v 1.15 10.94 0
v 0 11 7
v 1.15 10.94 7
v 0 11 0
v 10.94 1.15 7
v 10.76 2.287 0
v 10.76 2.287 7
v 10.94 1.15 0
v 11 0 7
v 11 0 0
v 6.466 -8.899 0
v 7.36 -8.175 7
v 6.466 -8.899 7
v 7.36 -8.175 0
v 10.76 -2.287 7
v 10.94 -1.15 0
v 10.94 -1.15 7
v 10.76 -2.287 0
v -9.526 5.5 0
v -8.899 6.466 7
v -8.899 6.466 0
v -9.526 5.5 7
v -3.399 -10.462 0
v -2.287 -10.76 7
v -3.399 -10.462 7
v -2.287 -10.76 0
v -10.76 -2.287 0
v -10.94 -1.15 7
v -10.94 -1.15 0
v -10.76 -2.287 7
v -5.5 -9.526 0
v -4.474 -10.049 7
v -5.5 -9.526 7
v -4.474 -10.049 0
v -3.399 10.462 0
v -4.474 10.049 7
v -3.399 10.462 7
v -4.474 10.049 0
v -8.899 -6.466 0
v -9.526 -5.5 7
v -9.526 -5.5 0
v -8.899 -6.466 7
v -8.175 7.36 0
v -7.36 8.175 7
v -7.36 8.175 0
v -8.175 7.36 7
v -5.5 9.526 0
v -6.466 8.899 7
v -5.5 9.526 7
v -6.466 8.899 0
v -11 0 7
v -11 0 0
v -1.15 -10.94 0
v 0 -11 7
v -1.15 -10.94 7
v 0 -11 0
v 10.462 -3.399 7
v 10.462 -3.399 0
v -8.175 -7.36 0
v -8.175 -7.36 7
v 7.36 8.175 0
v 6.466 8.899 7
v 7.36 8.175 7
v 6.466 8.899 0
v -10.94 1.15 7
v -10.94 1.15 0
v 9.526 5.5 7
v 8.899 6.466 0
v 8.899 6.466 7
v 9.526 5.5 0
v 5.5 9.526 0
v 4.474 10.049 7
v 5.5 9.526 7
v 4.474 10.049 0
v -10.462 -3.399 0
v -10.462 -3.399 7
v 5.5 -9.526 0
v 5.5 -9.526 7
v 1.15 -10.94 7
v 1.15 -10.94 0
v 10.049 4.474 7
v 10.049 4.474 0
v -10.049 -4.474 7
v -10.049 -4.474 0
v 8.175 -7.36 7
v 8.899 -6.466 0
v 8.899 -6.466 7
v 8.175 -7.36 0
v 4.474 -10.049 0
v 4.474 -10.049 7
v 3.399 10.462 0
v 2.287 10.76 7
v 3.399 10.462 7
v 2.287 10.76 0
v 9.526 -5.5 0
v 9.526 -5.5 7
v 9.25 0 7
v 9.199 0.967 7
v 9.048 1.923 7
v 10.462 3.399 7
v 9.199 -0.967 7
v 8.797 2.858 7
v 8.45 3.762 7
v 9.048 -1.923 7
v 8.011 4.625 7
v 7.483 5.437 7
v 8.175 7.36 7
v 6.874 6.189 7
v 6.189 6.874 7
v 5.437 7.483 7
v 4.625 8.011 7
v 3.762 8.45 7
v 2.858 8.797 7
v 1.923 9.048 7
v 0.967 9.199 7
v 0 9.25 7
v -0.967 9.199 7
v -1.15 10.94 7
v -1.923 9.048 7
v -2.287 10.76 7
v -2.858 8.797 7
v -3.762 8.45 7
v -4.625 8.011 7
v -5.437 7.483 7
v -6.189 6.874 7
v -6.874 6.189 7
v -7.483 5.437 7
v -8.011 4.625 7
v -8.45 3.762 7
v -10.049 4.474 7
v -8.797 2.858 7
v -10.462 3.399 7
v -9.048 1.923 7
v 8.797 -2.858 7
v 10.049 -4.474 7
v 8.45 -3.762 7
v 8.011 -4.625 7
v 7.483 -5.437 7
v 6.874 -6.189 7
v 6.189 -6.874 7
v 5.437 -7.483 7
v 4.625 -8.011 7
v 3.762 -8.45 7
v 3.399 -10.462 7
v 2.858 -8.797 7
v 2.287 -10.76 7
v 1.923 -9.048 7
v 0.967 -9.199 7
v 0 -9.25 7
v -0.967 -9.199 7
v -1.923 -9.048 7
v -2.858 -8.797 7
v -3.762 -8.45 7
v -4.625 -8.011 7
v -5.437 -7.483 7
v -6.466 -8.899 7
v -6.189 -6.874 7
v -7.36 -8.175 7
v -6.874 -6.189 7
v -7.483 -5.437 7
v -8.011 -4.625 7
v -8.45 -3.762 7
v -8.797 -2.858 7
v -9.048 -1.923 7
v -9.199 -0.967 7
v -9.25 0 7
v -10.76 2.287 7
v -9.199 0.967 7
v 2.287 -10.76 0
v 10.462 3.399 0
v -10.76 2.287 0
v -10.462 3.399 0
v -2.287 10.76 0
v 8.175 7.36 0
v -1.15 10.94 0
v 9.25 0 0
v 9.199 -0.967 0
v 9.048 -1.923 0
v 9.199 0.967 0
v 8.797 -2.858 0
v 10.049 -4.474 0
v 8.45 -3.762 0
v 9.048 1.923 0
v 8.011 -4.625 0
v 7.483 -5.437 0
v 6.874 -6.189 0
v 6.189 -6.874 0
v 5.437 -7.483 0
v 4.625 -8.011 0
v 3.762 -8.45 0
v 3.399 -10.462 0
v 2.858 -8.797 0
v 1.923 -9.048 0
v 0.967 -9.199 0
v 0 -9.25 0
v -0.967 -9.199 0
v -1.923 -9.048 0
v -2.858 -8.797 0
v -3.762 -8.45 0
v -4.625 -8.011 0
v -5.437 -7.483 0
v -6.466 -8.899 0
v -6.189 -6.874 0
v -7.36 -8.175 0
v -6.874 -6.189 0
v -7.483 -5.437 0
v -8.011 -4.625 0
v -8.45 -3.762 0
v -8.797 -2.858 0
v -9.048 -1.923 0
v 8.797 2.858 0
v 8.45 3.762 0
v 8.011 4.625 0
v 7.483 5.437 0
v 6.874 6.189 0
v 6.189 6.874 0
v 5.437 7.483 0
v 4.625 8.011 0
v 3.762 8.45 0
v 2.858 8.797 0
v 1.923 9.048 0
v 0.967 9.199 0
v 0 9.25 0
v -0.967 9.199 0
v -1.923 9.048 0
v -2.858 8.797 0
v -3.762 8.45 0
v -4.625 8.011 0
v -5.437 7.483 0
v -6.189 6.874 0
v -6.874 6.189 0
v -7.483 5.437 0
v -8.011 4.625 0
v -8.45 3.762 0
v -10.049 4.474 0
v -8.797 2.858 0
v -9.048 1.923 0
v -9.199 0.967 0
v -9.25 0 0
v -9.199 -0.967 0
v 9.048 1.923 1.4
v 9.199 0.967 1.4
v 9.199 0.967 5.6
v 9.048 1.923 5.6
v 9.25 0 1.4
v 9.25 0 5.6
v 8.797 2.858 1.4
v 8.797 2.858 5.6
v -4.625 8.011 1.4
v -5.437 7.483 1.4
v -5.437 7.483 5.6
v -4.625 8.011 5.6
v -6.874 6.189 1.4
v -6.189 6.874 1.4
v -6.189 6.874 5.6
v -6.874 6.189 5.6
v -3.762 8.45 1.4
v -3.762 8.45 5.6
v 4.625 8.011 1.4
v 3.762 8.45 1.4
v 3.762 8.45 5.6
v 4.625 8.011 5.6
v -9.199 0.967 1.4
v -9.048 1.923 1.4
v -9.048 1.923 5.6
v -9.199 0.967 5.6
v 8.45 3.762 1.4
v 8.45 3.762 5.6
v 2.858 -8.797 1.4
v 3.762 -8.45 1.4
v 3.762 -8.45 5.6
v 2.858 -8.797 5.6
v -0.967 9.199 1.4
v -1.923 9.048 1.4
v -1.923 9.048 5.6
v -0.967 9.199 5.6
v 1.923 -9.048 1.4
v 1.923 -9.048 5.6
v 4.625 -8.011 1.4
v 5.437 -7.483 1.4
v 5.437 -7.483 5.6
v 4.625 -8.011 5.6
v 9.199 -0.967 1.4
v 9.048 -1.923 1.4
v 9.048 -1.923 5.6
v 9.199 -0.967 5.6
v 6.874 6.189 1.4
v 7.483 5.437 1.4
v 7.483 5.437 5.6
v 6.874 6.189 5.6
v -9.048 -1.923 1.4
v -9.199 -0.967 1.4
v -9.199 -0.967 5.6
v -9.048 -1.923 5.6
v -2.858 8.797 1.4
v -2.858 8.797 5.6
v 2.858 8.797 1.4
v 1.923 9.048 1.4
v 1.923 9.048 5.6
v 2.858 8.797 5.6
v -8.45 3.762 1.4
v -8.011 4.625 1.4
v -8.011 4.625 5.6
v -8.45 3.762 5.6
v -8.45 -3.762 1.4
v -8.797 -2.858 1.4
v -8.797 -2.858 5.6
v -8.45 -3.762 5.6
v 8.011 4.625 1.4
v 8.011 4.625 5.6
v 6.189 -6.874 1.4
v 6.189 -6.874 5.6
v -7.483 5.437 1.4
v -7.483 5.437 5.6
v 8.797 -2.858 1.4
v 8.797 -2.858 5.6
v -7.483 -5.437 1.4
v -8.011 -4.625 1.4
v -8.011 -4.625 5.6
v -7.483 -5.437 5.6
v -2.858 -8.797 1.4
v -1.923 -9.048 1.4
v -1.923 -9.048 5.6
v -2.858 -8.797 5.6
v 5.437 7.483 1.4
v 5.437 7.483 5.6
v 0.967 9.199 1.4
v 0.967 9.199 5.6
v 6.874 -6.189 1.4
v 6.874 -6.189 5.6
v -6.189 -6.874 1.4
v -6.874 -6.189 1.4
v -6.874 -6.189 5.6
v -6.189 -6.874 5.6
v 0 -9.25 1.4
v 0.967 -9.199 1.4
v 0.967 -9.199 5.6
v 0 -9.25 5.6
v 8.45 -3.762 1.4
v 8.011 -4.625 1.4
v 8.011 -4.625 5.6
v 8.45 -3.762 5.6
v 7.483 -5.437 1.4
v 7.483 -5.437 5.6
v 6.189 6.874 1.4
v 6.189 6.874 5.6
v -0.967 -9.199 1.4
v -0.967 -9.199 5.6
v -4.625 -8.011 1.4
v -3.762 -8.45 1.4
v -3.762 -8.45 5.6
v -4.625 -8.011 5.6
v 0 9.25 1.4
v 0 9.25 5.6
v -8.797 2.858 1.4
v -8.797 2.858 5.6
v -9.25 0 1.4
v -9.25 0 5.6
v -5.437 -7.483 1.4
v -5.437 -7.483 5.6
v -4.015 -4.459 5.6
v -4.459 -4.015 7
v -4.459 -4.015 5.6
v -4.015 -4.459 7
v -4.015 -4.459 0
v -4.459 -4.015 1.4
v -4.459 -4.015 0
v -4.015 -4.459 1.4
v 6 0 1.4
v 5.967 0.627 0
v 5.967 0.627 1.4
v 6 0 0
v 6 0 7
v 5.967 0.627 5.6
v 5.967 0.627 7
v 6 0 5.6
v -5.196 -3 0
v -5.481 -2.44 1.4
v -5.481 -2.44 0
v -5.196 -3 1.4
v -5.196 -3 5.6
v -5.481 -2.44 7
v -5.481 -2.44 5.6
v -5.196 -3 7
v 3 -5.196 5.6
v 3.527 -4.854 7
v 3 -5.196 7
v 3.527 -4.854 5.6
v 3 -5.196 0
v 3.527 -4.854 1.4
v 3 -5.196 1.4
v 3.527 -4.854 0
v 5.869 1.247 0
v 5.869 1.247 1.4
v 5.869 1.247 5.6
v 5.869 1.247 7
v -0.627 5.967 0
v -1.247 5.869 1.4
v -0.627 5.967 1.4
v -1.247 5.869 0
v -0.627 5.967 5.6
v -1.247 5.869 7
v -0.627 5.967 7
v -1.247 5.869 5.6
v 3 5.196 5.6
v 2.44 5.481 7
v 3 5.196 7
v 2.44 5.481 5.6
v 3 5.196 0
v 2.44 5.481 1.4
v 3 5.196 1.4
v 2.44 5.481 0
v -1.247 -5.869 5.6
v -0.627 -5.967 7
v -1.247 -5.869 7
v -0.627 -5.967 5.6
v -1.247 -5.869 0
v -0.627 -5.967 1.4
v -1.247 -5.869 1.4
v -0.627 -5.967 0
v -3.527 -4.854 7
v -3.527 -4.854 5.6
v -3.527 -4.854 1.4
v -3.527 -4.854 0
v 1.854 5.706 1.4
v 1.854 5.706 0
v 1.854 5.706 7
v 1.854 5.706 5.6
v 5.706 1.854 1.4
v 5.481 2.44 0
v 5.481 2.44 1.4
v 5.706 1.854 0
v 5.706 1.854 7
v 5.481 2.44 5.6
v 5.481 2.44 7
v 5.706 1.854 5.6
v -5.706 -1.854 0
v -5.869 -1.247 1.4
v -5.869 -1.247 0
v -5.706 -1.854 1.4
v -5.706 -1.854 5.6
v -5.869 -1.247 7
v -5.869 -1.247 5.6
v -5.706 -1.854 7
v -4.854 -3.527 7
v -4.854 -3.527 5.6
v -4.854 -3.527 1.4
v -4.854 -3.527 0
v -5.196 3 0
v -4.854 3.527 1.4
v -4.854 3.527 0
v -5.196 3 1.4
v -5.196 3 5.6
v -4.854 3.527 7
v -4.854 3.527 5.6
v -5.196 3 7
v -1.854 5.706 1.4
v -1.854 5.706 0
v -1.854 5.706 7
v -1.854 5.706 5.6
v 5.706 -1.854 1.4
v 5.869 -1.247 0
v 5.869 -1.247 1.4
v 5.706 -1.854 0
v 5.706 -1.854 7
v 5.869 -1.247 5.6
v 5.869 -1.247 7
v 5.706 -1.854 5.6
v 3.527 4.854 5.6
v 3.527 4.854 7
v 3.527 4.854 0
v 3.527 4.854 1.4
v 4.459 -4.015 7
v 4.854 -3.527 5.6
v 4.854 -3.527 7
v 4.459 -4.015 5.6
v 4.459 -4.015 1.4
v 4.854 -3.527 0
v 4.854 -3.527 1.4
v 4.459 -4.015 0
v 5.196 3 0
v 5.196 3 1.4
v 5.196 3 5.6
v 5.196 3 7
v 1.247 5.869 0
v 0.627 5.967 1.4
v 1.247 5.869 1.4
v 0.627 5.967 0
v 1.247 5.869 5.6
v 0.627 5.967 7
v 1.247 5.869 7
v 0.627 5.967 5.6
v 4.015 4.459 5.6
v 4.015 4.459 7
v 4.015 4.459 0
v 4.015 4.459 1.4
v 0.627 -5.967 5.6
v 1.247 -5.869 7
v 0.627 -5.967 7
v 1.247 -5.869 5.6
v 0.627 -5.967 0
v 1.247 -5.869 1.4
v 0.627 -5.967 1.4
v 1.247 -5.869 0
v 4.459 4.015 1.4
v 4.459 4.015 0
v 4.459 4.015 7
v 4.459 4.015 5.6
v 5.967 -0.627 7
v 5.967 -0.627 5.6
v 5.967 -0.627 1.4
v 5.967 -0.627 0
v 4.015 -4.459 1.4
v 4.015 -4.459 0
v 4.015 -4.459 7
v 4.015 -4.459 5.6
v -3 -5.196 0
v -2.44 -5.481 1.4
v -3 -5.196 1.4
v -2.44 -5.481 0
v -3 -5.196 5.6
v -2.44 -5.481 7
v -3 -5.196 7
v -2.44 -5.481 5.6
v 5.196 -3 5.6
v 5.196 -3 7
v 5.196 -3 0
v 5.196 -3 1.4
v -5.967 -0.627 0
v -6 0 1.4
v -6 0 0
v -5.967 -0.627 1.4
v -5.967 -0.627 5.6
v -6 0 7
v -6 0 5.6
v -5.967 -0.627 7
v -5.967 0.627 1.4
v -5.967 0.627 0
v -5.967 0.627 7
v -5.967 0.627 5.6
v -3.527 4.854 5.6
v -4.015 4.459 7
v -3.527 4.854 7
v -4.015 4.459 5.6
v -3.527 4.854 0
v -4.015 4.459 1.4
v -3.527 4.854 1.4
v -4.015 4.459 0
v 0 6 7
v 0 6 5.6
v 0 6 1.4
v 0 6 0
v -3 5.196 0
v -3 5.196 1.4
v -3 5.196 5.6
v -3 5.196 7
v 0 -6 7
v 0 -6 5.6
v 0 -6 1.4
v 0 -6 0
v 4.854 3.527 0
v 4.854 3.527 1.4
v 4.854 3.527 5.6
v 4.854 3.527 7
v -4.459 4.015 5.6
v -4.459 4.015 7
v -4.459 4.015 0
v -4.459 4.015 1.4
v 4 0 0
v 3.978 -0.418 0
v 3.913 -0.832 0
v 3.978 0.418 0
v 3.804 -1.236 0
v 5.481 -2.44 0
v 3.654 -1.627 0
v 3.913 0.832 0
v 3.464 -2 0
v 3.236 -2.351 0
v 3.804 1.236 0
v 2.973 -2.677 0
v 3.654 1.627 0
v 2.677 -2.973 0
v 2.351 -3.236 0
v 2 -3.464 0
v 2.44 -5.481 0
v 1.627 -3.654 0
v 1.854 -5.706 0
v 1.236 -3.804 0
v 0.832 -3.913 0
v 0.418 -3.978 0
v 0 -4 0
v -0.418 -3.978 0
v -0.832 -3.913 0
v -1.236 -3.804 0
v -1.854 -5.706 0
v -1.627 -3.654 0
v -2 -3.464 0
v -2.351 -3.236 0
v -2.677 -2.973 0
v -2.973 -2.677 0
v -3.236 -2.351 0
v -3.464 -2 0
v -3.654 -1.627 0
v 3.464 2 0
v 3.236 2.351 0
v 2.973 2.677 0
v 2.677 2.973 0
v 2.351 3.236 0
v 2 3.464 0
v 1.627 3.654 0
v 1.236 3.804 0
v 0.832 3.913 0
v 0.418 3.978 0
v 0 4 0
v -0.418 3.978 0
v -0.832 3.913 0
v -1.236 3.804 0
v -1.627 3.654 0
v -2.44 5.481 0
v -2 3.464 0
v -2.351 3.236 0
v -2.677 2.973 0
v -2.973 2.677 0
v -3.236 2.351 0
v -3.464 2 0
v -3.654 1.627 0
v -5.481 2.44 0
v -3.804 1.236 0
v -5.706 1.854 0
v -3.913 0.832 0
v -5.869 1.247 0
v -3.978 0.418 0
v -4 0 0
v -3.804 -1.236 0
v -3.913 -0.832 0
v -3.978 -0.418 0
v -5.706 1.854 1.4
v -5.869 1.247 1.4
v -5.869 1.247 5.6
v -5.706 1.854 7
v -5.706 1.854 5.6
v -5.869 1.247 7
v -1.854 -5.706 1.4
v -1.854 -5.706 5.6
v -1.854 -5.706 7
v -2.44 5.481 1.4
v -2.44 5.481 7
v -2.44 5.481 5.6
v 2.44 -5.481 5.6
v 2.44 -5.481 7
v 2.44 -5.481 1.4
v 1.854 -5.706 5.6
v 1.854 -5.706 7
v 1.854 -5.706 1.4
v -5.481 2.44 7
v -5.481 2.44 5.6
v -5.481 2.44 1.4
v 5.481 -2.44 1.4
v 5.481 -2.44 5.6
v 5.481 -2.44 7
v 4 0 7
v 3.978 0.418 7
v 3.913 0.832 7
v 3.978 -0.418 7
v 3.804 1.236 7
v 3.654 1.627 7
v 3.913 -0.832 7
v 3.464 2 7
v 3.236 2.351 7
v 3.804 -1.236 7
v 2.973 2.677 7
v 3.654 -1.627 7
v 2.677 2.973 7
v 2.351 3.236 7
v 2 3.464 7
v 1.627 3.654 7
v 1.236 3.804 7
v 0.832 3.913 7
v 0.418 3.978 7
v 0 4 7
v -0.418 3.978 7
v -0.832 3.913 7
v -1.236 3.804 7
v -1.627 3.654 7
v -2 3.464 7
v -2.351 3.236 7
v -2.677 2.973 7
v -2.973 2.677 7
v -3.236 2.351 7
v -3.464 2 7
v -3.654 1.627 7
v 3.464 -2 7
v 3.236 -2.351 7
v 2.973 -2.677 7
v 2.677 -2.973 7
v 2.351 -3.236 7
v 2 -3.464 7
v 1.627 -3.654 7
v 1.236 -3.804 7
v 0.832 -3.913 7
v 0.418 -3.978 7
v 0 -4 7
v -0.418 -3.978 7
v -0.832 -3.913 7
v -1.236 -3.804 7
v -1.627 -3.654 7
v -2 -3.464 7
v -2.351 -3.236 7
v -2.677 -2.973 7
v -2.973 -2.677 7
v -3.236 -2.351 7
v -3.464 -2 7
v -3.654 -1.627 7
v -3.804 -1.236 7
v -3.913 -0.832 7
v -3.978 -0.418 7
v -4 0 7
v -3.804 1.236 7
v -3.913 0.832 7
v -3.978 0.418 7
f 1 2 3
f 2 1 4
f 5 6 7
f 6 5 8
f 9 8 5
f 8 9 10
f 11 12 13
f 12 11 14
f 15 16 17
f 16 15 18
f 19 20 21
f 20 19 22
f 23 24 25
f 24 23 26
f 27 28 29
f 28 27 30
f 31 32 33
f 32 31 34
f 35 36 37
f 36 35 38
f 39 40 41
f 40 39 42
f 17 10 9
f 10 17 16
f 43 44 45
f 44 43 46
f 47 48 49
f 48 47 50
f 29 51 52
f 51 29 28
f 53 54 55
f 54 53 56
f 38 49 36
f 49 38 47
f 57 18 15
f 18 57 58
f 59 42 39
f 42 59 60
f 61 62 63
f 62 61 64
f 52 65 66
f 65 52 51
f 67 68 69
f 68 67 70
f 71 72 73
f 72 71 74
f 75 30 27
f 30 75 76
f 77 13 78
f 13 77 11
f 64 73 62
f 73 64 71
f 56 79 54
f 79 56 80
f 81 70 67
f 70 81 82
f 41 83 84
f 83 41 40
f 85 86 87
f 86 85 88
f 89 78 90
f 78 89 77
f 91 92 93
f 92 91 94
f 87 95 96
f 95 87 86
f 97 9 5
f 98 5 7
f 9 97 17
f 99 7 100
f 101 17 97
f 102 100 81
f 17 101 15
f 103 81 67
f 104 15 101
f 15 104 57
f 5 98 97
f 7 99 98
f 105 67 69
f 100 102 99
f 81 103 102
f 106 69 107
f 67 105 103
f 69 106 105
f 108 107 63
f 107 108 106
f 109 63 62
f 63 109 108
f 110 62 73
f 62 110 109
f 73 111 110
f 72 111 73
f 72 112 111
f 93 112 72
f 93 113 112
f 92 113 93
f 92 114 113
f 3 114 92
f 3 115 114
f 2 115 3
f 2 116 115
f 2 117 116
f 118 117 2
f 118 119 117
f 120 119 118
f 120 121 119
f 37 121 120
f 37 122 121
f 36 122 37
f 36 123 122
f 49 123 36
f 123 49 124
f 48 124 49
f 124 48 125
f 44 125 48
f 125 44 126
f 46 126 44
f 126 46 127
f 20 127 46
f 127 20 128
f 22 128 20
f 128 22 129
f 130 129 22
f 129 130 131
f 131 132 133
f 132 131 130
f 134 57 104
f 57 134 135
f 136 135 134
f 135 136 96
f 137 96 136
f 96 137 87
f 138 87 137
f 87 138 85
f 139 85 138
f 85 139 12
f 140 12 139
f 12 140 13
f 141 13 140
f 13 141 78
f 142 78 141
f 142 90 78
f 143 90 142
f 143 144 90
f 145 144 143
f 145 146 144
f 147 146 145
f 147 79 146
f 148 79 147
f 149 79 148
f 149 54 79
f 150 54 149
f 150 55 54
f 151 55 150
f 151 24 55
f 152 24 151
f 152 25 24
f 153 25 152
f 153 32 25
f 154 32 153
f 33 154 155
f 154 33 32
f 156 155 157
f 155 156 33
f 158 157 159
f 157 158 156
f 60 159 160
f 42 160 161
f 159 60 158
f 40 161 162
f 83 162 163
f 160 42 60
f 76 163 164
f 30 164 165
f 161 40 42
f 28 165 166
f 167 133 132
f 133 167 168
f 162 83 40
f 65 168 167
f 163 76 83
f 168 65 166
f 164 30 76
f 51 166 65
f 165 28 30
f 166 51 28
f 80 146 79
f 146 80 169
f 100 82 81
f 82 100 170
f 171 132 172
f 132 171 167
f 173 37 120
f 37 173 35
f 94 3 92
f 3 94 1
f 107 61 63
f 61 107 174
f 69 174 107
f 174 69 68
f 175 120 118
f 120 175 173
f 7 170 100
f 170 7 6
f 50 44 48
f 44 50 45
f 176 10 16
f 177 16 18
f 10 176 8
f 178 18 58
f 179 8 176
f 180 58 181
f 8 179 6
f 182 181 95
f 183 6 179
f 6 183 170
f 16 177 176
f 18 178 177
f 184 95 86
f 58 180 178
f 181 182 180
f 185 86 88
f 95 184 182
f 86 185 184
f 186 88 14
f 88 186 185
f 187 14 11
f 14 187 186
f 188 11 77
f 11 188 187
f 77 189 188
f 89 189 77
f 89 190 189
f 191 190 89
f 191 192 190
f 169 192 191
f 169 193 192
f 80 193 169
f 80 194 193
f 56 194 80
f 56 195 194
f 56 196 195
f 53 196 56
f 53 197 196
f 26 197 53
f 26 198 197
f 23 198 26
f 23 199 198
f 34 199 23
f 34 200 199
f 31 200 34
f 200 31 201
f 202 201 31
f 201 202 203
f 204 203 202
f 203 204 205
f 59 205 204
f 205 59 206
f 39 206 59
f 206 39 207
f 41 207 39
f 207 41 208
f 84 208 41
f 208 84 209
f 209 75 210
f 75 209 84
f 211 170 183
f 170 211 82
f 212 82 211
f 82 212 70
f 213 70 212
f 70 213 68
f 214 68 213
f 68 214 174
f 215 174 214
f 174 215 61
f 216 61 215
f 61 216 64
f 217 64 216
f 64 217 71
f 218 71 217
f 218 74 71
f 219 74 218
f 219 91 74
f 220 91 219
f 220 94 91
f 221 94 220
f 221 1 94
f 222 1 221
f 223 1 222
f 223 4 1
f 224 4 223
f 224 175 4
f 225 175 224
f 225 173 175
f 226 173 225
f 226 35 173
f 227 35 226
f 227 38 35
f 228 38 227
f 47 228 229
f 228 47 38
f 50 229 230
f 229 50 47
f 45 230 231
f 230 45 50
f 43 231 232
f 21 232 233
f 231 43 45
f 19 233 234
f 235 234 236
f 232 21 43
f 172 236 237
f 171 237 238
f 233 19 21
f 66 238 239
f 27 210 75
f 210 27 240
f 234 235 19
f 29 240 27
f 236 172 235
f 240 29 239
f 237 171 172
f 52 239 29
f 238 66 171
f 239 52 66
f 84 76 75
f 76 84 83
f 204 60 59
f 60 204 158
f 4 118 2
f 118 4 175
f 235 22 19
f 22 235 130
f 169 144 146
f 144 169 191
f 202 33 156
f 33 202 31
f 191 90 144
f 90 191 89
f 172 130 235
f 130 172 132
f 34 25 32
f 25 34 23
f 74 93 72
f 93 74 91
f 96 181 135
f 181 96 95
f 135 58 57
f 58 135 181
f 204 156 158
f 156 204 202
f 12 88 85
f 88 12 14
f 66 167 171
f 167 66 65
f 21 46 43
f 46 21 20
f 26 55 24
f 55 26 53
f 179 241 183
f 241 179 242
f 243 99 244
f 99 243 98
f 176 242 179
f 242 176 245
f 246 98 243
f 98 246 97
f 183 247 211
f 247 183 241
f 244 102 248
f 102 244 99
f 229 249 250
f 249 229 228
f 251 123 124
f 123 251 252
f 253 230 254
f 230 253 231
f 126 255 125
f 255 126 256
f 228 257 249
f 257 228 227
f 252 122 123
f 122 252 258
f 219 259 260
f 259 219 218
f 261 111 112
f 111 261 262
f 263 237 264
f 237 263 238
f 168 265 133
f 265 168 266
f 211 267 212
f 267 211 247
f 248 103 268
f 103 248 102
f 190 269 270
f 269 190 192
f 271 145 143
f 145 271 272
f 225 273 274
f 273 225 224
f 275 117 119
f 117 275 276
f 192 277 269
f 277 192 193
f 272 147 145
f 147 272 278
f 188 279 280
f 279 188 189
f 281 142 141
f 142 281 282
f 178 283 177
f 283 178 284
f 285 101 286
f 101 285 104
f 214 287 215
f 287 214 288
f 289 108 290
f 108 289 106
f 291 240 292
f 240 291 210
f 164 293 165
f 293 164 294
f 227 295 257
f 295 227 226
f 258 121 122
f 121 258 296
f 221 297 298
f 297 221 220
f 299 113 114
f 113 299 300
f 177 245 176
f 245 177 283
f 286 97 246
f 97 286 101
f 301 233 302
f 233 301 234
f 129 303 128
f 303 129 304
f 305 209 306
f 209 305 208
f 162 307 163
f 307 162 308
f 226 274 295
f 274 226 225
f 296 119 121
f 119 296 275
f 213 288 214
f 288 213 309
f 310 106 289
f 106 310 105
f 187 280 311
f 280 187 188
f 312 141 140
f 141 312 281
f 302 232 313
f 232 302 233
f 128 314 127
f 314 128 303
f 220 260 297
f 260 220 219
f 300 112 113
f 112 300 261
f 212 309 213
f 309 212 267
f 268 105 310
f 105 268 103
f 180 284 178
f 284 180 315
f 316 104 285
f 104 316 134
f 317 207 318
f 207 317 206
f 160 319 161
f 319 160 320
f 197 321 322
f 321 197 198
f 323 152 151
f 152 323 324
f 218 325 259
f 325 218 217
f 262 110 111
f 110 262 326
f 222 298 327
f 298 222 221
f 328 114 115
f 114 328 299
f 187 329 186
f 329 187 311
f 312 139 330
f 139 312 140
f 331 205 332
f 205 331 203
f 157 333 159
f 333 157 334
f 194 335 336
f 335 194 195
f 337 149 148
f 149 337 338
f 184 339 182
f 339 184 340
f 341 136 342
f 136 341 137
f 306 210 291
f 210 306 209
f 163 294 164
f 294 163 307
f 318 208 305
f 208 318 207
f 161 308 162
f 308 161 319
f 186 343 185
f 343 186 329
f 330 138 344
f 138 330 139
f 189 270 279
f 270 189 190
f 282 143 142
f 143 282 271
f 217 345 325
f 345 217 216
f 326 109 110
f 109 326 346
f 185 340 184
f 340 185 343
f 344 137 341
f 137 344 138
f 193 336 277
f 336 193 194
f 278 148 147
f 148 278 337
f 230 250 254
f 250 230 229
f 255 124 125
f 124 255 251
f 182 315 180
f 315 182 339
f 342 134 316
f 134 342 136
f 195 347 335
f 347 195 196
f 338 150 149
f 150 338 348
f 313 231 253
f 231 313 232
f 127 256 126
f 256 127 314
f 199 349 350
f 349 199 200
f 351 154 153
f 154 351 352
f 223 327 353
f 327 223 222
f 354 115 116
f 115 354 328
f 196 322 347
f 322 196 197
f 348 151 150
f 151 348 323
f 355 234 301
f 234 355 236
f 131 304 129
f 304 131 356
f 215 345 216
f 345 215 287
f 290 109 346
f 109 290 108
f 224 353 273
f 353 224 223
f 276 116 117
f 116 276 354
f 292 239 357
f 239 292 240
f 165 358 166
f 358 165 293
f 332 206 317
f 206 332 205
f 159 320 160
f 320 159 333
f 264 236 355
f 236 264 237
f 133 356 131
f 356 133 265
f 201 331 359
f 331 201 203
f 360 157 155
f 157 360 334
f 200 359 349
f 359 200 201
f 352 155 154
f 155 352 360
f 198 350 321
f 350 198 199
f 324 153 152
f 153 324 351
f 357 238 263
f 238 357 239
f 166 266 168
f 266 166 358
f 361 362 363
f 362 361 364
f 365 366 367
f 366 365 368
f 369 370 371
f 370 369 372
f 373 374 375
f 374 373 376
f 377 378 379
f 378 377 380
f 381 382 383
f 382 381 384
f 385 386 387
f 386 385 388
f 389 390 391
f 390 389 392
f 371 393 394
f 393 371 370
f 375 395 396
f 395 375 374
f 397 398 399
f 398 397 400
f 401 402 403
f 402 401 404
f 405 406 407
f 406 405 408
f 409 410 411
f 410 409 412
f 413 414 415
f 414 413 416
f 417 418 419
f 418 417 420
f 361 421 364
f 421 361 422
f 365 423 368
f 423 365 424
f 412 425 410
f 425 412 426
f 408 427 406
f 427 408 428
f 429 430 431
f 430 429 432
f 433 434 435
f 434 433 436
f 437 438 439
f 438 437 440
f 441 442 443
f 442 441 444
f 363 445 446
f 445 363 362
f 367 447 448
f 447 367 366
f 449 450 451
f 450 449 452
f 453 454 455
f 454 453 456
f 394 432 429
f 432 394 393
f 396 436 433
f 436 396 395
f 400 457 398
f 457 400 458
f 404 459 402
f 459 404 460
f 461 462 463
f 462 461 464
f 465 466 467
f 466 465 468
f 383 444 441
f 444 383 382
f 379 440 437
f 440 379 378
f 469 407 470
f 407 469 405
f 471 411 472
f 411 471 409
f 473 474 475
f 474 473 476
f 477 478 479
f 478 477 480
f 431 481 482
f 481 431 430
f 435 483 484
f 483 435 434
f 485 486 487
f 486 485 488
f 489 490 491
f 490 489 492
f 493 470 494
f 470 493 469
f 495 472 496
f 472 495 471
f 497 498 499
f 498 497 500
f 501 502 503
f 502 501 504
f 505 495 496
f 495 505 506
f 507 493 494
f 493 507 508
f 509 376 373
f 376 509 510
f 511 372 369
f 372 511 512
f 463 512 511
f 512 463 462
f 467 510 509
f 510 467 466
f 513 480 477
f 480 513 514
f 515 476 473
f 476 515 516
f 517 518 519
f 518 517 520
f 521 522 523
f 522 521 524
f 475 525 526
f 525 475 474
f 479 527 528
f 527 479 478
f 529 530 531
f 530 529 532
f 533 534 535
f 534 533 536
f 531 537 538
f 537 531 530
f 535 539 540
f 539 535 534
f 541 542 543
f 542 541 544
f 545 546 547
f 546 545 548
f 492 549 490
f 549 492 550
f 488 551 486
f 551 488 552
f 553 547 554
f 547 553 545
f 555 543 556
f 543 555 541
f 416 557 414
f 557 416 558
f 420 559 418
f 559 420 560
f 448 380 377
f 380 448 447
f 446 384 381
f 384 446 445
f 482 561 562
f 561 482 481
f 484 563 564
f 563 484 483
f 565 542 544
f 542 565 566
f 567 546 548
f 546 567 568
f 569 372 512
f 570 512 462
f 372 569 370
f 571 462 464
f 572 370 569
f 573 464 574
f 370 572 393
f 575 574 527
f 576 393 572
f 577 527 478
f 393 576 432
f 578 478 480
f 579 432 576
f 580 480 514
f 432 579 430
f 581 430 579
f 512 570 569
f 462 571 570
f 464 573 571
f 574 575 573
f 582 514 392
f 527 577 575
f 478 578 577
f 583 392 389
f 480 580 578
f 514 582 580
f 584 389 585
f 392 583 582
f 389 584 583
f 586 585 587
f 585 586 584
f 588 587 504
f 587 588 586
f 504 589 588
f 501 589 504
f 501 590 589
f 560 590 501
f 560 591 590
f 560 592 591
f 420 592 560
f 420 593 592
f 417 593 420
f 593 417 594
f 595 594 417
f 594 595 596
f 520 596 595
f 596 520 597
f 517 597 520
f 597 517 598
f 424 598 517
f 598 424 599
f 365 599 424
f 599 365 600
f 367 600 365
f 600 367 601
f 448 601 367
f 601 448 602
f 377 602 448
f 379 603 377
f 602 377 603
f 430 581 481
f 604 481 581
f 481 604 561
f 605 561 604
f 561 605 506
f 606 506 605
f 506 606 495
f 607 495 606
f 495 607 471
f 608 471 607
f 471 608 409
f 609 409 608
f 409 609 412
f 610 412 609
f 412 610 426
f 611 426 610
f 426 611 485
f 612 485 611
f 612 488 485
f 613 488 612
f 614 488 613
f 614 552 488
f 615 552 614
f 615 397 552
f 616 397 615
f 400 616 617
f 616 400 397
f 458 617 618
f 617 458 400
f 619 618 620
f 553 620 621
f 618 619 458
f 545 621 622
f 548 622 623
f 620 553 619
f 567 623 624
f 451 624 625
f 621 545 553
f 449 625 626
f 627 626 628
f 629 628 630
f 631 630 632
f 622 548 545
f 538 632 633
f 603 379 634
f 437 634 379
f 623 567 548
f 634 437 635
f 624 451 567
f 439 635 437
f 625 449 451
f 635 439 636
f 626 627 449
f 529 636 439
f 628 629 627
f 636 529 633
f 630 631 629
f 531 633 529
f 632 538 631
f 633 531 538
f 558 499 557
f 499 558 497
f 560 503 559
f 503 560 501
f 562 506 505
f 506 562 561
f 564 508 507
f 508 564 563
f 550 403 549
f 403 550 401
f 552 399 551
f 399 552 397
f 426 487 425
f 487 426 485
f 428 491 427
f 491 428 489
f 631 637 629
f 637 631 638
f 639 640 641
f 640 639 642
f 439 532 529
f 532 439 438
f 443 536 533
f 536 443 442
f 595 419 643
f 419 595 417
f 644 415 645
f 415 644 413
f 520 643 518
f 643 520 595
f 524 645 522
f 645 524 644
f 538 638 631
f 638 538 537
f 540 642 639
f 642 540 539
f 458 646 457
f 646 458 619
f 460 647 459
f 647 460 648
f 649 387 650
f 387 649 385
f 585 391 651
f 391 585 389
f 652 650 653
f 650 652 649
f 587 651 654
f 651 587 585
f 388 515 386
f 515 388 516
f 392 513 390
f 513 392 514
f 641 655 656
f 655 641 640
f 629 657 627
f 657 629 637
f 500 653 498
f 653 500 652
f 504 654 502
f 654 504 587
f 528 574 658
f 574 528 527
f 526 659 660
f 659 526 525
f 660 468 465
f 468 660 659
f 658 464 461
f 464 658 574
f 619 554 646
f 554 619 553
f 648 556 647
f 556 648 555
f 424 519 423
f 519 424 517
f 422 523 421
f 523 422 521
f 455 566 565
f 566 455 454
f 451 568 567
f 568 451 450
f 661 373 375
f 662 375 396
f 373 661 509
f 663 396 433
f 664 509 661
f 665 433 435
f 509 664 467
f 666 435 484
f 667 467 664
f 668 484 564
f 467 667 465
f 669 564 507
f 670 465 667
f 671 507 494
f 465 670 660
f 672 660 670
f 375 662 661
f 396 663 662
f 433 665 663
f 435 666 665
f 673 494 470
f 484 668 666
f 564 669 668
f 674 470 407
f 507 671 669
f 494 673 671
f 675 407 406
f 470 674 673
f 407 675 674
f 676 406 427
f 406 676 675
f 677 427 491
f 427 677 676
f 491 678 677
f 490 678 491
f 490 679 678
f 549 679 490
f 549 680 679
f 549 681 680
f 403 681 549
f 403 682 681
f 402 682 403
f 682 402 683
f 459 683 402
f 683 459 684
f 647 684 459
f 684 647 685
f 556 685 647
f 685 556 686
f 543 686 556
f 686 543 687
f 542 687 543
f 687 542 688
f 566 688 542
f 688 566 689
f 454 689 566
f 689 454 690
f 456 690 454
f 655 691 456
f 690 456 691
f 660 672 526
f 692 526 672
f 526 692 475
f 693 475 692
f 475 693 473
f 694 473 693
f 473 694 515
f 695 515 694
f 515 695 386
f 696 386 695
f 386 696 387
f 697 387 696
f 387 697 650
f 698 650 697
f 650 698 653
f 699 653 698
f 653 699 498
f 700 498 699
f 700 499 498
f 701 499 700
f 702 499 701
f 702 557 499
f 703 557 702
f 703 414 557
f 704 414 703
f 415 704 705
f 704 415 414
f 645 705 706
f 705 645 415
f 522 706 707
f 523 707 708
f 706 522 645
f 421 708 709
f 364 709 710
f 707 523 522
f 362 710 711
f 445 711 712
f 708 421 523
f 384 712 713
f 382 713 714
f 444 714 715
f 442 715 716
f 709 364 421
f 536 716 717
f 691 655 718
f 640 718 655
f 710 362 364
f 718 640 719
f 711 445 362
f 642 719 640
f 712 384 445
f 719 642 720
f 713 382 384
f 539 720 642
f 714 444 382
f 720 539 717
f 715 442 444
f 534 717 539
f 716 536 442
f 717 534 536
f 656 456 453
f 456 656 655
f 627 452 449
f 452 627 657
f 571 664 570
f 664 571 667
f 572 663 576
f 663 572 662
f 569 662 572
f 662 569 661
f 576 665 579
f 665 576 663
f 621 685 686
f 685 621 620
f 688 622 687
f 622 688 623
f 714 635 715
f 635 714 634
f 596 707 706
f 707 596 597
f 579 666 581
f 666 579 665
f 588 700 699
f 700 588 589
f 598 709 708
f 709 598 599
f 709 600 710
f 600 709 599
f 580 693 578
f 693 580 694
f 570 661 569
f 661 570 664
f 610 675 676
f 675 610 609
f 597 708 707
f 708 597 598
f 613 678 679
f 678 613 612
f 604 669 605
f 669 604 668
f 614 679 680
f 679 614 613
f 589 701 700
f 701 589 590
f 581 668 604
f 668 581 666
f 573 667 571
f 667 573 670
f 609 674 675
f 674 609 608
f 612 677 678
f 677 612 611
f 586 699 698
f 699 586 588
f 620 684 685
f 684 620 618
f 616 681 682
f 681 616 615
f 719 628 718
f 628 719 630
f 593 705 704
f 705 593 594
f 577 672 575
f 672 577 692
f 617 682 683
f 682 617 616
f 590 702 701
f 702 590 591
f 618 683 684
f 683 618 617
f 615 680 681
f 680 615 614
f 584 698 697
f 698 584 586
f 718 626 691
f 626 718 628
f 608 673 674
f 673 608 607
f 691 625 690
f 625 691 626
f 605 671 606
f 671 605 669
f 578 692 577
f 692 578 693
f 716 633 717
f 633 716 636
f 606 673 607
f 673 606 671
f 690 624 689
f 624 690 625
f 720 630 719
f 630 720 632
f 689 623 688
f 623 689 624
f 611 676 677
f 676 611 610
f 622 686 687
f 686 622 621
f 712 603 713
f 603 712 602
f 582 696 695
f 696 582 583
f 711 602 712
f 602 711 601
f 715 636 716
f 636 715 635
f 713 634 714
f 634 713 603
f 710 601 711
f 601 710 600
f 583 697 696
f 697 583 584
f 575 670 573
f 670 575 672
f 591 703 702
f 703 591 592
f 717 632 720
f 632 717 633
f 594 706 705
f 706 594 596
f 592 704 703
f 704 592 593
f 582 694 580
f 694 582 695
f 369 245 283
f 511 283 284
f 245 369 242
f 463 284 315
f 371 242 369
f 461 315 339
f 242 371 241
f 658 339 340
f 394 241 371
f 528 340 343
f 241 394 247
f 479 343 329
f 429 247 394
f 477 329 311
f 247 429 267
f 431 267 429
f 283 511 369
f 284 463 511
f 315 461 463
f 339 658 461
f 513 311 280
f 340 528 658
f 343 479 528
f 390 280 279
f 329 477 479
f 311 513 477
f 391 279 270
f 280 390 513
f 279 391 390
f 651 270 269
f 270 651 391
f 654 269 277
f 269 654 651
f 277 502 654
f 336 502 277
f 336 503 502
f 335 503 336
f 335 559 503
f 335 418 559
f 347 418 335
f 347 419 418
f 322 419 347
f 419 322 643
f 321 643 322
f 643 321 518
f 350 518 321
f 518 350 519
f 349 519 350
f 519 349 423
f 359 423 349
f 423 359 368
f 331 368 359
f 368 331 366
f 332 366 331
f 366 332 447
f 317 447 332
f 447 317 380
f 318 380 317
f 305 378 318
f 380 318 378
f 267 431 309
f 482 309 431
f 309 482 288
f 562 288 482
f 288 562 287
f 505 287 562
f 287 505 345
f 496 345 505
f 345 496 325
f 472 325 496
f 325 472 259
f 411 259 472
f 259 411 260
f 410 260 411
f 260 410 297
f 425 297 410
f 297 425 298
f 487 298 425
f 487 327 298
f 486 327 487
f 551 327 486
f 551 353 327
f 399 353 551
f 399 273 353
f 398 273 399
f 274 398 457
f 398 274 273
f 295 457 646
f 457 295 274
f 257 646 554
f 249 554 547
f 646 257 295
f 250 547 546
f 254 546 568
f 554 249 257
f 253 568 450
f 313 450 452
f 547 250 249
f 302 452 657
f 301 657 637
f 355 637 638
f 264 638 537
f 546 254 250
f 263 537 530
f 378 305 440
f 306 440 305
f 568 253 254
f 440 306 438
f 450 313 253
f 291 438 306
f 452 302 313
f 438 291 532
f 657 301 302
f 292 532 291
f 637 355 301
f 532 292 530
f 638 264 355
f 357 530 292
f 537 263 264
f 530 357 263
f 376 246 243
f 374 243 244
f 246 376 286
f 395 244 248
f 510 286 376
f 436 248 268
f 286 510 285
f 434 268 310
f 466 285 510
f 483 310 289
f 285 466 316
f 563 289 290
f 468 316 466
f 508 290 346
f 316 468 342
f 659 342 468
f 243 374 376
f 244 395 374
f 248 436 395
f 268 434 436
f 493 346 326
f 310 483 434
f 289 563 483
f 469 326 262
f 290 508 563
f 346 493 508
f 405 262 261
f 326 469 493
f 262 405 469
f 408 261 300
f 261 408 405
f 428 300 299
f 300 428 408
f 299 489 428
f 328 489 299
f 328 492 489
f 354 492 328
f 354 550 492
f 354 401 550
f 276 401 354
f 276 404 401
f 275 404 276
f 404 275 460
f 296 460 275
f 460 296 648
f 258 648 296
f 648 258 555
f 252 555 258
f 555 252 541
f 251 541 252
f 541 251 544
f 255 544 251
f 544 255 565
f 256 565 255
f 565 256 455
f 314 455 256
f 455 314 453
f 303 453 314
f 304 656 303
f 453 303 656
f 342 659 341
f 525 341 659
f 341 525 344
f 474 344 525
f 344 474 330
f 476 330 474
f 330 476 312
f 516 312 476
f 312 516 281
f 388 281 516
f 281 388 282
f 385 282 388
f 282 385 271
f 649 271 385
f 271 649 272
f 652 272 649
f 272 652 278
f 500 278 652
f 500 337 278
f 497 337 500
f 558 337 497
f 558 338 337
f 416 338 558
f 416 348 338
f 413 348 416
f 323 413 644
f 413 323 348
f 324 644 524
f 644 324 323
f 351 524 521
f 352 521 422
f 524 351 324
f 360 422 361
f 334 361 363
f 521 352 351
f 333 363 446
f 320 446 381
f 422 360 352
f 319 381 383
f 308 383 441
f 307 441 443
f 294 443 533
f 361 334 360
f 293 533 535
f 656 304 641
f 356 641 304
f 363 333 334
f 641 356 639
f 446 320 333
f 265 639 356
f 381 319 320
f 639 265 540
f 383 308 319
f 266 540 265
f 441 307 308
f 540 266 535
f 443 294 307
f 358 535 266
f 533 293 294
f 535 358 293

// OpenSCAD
// file: design_params.scad
// ============================================================
// SKUA SHARED DESIGN PARAMETERS — single source of truth for
// every dimension two parts must agree on.
//
// Consumers:
//   - every part in cad/ does        include <design_params.scad>
//   - parts in cad/calibration/ do   include <../design_params.scad>
//   - scripts/check_params.py FAILS the build if any of these names
//     is re-declared anywhere else — change values HERE only.
//
// Keep this file to simple `name = value;` lines so the tooling can
// parse it. One-off experiments: `openscad -D name=value` beats the
// include, no need to edit this file.
// ============================================================

// --- Aluminum rod stock (bought; ONE diameter everywhere) ---
// 8 mm rod is chosen to match the 608 bearing bore, so the shaft and
// both arms cut from the same stock.
rod_d        = 8;
shaft_length = 300;  // vertical shaft; sets how high the rotor rides.
                     // Long enough that the hanging vanes clear the
                     // plank — geometry_check.py gates the clearance.
arm_length   = 600;  // each horizontal arm (two of them)

// --- 608 skateboard bearing (bought, TWO of them) ---
// Two bearings spaced apart in the base tower instead of one: a single
// 7 mm-wide bearing lets a 1.2 m rotor wobble; two races 45 mm apart
// make the shaft run true. They come in packs of 8 anyway.
bearing_od = 22;
bearing_w  = 7;
bearing_inner_shoulder_d = 12;  // inner-ring shoulder: anything riding
                                // the INNER race (collar boss) stays
                                // inside this; anything static stays
                                // outside it
pocket_recess = 0.5;  // bearings sit this far below the tower faces so
                      // the rotating inner race never rubs plank or collar body

// --- Calibrated fits (print the gauges, type the winners in here) ---
bearing_press_d = 21.8; // pocket that grips the outer race — cad/calibration/bearing_pocket_gauge.scad
rod_snug_d      = 8.2;  // sockets the rod presses into (hub, collar, cap) — cad/calibration/rod_fit_gauge.scad
rod_free_d      = 8.6;  // bores that must SPIN on the rod (vane sleeve) — same gauge
fit_tol         = 0.2;  // clearance for printed slots/pockets

// --- Base (screwed to the plank) ---
base_d         = 110;
base_t         = 6;
screw_hole_d   = 4.5;   // 4.2 mm wood screws
screw_head_d   = 9.5;   // countersink cone top diameter
screw_circle_d = 90;
screw_count    = 4;
tower_od       = 32;
tower_h        = 60;    // bearing pockets at top and bottom of this
tower_bore_d   = 19;    // between the pockets: retains the outer races,
                        // clears the 12 mm inner-race shoulders
gusset_t       = 4;
gusset_reach   = 16;    // how far a gusset runs out from the tower wall
gusset_h       = 35;

// --- Hub (clamps the shaft top, carries both arms) ---
hub_len          = 70;  // along the arms
hub_w            = 26;
hub_h            = 38;
hub_arm_z        = 30;  // arm bore axis above the hub bottom face
hub_shaft_socket = 22;  // blind shaft socket depth, from the bottom
hub_arm_socket   = 30;  // blind arm socket depth, from each end
hub_corner_r     = 6;

// --- M3 hardware (set screws and the collar clamp) ---
m3_thread_d = 2.9;  // screw forms its own thread (end cap set screw)
m3_clear_d  = 3.4;
m3_nut_af   = 5.8;  // nut across flats, incl. pocket clearance
m3_nut_t    = 2.6;
m3_head_d   = 6.4;

// --- Vane (the flapping flag; TWO of them) ---
vane_sleeve_len = 70;
vane_sleeve_od  = 16;
vane_width      = 150; // panel size along the arm
vane_drop       = 150; // sleeve AXIS to the panel bottom edge
vane_t          = 2;
vane_rim_w      = 3;   // stiffening rim around the panel
vane_rim_h      = 5;
vane_swing_deg  = 120; // free swing between the two stops

// --- Stop cap (arm tip: retains the vane, carries the stop pin) ---
cap_d          = 20;
cap_t          = 10;
cap_bore_depth = 8;
cap_pin_d      = 3.5;
cap_pin_len    = 5;
cap_pin_r      = 6.4;  // pin center radius: clears the rod, lands on the
                       // vane sleeve wall (geometry_check.py verifies both)

// --- Clamp collar (THREE: shaft thrust support + one per arm) ---
collar_od     = 20;
collar_w      = 8;
collar_boss_d = 12;    // rides the bearing inner race / vane sleeve end
collar_boss_h = 2;
collar_slit   = 2;

// --- Assembly stations / sanity limits ---
shaft_bottom_gap = 2;   // shaft tip hovers this far above the plank
printer_bed      = 210; // largest printable footprint, gates part sizes
// main file
// Visual model of a bought 608 bearing — NOT a printed part
// (regen_all.py deliberately exports no STL for it). Exists so
// main_assembly.scad can show the parts in context.

include <design_params.scad>

module bearing_608() {
    color("Silver") {
        // outer ring
        difference() {
            cylinder(h = bearing_w, d = bearing_od);
            translate([0, 0, -0.1])
                cylinder(h = bearing_w + 0.2, d = bearing_od - 3.5);
        }
        // inner ring
        difference() {
            cylinder(h = bearing_w, d = bearing_inner_shoulder_d);
            translate([0, 0, -0.1])
                cylinder(h = bearing_w + 0.2, d = rod_d);
        }
    }
    // shield band between the rings
    color("DarkSlateGray")
        translate([0, 0, bearing_w * 0.2])
            difference() {
                cylinder(h = bearing_w * 0.6, d = bearing_od - 3.5 + 0.1);
                translate([0, 0, -0.1])
                    cylinder(h = bearing_w, d = bearing_inner_shoulder_d - 0.1);
            }
}

$fn = 60;
bearing_608();
